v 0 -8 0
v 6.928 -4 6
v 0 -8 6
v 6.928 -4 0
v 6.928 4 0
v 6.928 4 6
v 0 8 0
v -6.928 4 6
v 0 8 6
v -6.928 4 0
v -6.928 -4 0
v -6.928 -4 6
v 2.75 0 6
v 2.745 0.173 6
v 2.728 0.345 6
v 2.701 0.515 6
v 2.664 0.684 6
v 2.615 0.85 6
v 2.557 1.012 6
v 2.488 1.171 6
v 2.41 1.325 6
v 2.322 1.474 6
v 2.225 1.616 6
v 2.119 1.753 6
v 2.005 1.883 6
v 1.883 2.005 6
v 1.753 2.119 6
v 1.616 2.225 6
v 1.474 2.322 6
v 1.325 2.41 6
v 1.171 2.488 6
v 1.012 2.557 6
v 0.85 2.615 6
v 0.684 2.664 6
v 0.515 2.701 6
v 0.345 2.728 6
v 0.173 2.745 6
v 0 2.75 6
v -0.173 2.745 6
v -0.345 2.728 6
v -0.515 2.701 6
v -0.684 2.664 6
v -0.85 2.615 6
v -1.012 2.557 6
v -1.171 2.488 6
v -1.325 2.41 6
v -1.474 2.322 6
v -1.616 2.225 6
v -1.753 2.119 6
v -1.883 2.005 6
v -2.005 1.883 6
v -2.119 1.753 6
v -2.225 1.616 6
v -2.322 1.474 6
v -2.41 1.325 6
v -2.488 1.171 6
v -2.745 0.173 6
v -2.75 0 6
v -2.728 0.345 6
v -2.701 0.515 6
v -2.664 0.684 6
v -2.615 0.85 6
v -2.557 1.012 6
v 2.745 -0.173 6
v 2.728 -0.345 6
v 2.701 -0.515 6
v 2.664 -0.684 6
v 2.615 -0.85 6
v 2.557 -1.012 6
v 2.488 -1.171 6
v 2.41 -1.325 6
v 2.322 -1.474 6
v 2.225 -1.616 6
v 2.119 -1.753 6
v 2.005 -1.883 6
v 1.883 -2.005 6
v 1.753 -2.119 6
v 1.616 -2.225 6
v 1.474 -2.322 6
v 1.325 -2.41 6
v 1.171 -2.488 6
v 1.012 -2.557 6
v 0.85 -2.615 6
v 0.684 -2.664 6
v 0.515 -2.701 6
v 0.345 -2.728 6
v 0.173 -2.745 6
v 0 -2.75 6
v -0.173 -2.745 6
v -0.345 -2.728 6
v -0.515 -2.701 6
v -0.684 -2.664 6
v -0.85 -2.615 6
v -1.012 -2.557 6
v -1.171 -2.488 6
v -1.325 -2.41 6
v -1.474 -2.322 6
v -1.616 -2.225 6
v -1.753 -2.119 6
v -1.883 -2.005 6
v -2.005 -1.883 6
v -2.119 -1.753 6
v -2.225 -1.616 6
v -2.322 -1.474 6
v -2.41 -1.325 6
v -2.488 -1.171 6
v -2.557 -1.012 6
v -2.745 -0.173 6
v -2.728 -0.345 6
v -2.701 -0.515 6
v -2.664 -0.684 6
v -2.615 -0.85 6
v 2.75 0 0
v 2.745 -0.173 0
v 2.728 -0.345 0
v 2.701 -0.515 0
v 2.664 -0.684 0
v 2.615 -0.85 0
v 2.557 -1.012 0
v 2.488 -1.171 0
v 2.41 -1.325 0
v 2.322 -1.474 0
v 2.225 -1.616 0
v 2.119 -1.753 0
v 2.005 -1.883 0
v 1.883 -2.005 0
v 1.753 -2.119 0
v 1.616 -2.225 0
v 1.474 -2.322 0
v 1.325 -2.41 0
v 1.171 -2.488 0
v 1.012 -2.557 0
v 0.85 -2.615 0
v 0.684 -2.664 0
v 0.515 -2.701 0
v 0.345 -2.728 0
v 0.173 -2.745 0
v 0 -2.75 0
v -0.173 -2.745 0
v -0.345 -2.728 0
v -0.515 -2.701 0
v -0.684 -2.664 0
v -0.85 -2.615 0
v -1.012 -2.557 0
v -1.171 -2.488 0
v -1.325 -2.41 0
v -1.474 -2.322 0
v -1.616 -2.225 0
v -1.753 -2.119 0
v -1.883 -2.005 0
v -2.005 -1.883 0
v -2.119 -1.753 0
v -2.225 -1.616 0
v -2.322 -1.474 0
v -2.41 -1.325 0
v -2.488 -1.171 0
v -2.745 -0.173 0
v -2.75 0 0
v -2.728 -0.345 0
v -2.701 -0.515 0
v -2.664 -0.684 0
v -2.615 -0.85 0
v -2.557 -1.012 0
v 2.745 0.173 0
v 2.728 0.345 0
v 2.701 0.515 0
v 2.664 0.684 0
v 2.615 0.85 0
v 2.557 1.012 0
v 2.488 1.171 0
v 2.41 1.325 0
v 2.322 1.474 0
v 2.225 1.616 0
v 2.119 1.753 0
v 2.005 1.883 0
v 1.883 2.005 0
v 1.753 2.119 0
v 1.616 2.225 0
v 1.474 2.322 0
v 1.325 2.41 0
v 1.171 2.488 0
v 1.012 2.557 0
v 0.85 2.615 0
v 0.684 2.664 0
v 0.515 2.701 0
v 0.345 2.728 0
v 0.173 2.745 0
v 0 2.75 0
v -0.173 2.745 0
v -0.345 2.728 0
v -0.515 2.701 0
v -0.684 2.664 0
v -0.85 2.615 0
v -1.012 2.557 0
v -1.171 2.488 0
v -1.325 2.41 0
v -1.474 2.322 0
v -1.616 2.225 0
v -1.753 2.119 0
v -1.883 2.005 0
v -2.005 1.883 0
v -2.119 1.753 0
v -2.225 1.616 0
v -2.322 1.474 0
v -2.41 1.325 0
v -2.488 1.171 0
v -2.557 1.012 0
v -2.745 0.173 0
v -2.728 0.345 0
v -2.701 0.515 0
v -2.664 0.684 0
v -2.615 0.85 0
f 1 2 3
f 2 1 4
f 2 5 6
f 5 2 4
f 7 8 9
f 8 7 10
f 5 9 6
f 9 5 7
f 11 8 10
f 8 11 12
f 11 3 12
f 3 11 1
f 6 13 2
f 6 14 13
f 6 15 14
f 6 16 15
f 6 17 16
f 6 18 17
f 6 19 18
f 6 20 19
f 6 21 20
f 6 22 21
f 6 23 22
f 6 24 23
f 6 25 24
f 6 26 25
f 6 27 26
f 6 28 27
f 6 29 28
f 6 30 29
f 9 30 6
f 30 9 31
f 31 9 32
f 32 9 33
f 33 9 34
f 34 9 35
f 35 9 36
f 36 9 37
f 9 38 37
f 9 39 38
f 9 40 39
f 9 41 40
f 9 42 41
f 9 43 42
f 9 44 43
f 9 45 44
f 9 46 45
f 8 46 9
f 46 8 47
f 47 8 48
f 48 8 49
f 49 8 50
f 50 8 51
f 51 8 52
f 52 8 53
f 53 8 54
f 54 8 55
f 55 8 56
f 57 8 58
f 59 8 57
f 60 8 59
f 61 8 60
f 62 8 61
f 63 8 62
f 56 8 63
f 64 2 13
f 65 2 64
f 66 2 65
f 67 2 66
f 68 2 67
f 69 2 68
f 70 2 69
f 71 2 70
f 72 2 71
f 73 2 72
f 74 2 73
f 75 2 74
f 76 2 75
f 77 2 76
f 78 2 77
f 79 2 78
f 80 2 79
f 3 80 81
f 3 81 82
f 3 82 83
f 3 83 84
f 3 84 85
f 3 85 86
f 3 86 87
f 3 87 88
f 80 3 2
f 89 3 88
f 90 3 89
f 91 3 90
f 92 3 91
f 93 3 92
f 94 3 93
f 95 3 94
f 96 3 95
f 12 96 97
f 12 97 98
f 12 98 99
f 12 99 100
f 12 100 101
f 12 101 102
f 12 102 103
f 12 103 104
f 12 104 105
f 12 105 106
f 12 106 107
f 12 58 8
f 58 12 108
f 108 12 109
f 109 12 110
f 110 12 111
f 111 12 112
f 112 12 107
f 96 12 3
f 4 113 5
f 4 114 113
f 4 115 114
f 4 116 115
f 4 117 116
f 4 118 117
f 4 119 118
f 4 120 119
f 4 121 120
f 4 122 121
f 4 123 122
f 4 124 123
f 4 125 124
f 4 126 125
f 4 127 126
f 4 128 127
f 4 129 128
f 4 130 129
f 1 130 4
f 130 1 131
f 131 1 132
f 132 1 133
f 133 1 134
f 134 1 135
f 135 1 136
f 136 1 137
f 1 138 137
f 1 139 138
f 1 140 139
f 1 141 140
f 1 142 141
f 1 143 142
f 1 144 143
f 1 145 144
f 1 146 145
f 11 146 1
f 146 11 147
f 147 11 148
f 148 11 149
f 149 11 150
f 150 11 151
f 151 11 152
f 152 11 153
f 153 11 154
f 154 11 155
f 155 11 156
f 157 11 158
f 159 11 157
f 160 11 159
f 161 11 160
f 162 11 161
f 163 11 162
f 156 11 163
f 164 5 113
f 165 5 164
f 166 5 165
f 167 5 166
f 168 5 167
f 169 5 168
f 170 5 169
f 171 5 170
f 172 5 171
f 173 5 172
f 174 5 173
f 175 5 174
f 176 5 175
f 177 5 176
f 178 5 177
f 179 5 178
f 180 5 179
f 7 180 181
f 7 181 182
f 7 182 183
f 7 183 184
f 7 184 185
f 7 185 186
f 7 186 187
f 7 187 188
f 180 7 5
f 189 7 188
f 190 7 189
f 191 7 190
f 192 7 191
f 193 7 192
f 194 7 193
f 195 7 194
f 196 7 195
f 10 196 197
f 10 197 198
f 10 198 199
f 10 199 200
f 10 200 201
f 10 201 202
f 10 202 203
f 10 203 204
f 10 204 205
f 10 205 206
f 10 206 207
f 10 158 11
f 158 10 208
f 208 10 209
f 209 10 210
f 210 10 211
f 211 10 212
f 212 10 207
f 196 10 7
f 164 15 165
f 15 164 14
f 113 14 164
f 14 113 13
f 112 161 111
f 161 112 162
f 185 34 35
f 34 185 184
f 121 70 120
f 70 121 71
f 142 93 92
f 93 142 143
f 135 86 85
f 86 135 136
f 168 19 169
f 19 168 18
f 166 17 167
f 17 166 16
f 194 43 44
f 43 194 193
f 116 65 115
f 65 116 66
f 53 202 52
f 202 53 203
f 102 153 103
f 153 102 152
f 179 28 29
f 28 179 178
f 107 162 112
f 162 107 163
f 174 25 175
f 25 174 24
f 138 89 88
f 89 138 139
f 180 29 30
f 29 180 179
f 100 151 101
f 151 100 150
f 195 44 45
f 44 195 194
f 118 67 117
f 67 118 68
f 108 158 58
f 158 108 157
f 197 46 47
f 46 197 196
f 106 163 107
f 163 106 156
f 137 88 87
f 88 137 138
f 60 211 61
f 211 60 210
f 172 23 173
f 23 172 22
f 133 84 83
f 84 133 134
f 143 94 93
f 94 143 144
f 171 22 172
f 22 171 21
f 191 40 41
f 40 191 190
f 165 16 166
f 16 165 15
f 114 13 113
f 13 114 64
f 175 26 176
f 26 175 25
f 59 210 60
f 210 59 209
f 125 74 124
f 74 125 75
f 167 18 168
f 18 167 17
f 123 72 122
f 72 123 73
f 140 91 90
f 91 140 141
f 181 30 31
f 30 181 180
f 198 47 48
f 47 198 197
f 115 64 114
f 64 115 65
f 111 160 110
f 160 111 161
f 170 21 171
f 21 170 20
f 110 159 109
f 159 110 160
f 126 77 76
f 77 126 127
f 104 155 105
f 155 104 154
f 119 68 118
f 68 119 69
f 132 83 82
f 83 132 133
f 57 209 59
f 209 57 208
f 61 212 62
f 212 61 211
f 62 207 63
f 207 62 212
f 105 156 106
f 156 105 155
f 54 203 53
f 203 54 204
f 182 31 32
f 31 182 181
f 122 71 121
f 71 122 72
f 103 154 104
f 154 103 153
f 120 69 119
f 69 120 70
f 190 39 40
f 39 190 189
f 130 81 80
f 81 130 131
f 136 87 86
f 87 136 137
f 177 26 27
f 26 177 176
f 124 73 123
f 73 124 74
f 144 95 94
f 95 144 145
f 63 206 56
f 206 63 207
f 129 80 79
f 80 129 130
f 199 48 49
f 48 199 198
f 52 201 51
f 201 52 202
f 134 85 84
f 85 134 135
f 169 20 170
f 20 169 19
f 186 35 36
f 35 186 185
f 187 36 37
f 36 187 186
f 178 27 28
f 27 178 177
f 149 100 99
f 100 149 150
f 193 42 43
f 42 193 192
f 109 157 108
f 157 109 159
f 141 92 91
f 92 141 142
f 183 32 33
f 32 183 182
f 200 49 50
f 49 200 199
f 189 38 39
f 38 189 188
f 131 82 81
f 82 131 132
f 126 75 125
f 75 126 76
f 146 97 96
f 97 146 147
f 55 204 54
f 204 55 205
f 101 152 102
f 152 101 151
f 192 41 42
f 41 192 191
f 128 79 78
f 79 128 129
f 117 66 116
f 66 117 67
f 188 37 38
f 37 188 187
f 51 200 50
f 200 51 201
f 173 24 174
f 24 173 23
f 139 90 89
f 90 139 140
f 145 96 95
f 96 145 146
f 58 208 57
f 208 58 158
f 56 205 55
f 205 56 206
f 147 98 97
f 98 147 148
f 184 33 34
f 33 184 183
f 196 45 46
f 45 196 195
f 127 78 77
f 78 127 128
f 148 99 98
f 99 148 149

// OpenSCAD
// file: debug_functions.scad
// pct (0..100) -> t (0..path_portion)
function pct_to_t(pct, path_portion=1.0) = (pct/100) * path_portion;

// pega ponto no path em um pct
function path_point_at_pct(
    pct, hub_d, hub_height, blade_length, blade_offset,
    leadW_pct, trailW_pct, leadX_pct, trailX_pct,
    path_portion=1.0
) =
    toroidal_path_spline_3d(
        pct_to_t(pct, path_portion),
        hub_d, hub_height, blade_length, blade_offset,
        leadW_pct, trailW_pct, leadX_pct, trailX_pct
    );

// desenha todos os perfis nas posições correspondentes
// n_profiles = quantidade de itens que você tem em profiles/chords/etc
module draw_profiles_on_path(
    n_profiles,
    profiles, profile_pcts, chords, chord_pivot_pcts, attack_angles,
    hub_d, hub_height, blade_length, blade_offset,
    leadW_pct, trailW_pct, leadX_pct, trailX_pct,
    path_portion=1.0
){
    for (i=[0:n_profiles-1]) {
        p = path_point_at_pct(
            profile_pcts[i],
            hub_d, hub_height, blade_length, blade_offset,
            leadW_pct, trailW_pct, leadX_pct, trailX_pct,
            path_portion
        );

        // Coloca o perfil “chapado” no plano XY, centrado no ponto do path.
        // (A orientação ao longo da tangente a gente faz no próximo passo.)
        translate(p)
            draw_profile2D(
                profiles[i],
                chord = chords[i],
                chord_pivot_pct = chord_pivot_pcts[i],
                attack_angle = attack_angles[i]
            );
    }
}


// ============================================================
// desenhar caminho (tubo) a partir de uma lista de pontos 3D
// ============================================================
module path_polyline(points, steps, r=0.35){
    for (i = [0:steps-1]) {
        p0 = points[i];
        p1 = points[i+1];
        v  = p1 - p0;
        L  = norm(v);

        if (L > 1e-9) {
            translate(p0)
                rotate(
                    a = acos(v[2]/L),
                    v = [-v[1], v[0], 0]
                )
                    cylinder(h=L, r=r, $fn=24);
        }
    }
}

module path_points_debug(points, r=0.6){
    for (p = points) translate(p) sphere(r=r, $fn=24);
}


// ============================================================
// Desenha o perfil 2D com corda (chord)
// chord_pivot_pct: 0=LE, 50=meio, 100=TE
// ============================================================
module draw_profile2D(profile, chord=10, chord_pivot_pct=0, attack_angle=0, n=90){
    px = chord_pivot_pct/100;
    pts = profile_points(profile, n=n);

    // move pivot para x=0 e escala pela corda
    pts2 = [ for(p=pts) [ (p[0]-px)*chord, p[1]*chord ] ];

    rotate(attack_angle)
        polygon(points=pts2);
}

// ============================================================
// Polyline 2D -> desenha como "tubo" usando cilindros (sem len())
// steps2d = quantidade de segmentos (se pts tem N pontos, use N)
// ============================================================
module polyline2d_tube(pts2d, steps2d, r=0.12){
    for(i=[0:steps2d-2]){
        p0 = pts2d[i];
        p1 = pts2d[i+1];
        v  = [p1[0]-p0[0], p1[1]-p0[1], 0];
        L  = norm(v);

        if (L > 1e-9){
            translate([p0[0], p0[1], 0])
                rotate(a = acos(clamp(v[0]/L, -1, 1)), v=[0,0,1])
                    cylinder(h=L, r=r, $fn=16);
        }
    }
}

// fecha o contorno (liga último ao primeiro)
module polyline2d_tube_closed(pts2d, steps2d, r=0.12){
    polyline2d_tube(pts2d, steps2d, r=r);
    // fecha com o último segmento
    p0 = pts2d[steps2d-1];
    p1 = pts2d[0];
    v  = [p1[0]-p0[0], p1[1]-p0[1], 0];
    L  = norm(v);

    if (L > 1e-9){
        translate([p0[0], p0[1], 0])
            rotate(a = acos(clamp(v[0]/L, -1, 1)), v=[0,0,1])
                cylinder(h=L, r=r, $fn=16);
    }
}

// ============================================================
// Desenha o perfil como "linha" (tubo) já com chord/pivot/attack
// profile_line_steps é o N usado para gerar os pontos do perfil.
// Para ellipse: N = n (ex: 120)
// Para naca:    N = 2*(n+1) + 2*(n+1) ??? (no nosso naca4_points: concat(upper,lower) => 2*(n+1))
// então: steps2d = 2*(n+1) no NACA e steps2d = n no ellipse
// ============================================================
module draw_profile2D_as_line(profile, chord=10, chord_pivot_pct=0, attack_angle=0, n=90, r=0.12){
    px  = chord_pivot_pct/100;
    pts = profile_points(profile, n=n);

    // aplica pivot + chord
    pts2 = [ for(p=pts) [ (p[0]-px)*chord, p[1]*chord ] ];

    // rotaciona o perfil no plano (attack)
    // (fazendo rotação manual em 2D pra evitar depender de rotate() em filhos)
    ca = cos(attack_angle);
    sa = sin(attack_angle);
    pts3 = [ for(p=pts2) [ p[0]*ca - p[1]*sa, p[0]*sa + p[1]*ca ] ];

    // número de pontos do contorno:
    steps2d = list_size(pts3);

    polyline2d_tube_closed(pts3, steps2d, r=r);
}
// main file
// ============================================================
// toroidal_propeller.scad
// ============================================================

eps=1/128;
$fn=100;

include <helper_functions.scad>;
include <debug_functions.scad>;

// ============================================================
// Perfis no caminho, perpendiculares ao caminho,
// com corda paralela ao plano XY e roll 180 só na leading half.
// ============================================================
module draw_profiles_on_path_perp(
    profiles, profile_pcts, chords, chord_pivot_pcts, attack_angles,
    hub_d, hub_height, blade_length, blade_offset,
    leadW_pct, trailW_pct, leadX_pct, trailX_pct,
    path_portion=1.0
){
    n_profiles = list_size(profiles);

    for (i=[0:n_profiles-1]) {

        // t do caminho (0..path_portion)
        t = (profile_pcts[i]/100) * path_portion;

        // posição e tangente
        P = toroidal_path_spline_3d(
            t, hub_d, hub_height, blade_length, blade_offset,
            leadW_pct, trailW_pct, leadX_pct, trailX_pct
        );

        T = path_tangent_at_t(
            t, hub_d, hub_height, blade_length, blade_offset,
            leadW_pct, trailW_pct, leadX_pct, trailX_pct,
            dt=1e-3
        );

        // protege contra listas desalinhadas (evita “sumir” perfil)
        if (
            !is_undef(profile_pcts[i]) &&
            !is_undef(chords[i]) &&
            !is_undef(chord_pivot_pcts[i]) &&
            !is_undef(attack_angles[i])
        )
        translate(P)
            orient_profile_perp_with_chord_xy(T)
                trailing_upper_lower_fix(t, path_portion)
                    leading_roll_180(t, path_portion)
                        draw_profile2D_as_line(
                            profiles[i],
                            chord = chords[i],
                            chord_pivot_pct = chord_pivot_pcts[i],
                            attack_angle = attack_angles[i],
                            n = 90,     // ajuste: 60..120 é comum
                            r = 0.12    // espessura da linha
                        );
    }
}


// ============================================================
// Módulo principal
// ============================================================
module toroidal_propeller(
    blades=1,

    hub_height=6,
    hub_d=16,
    hub_screw_d=5.5,
    hub_notch_height=0,
    hub_notch_d=0,

    blade_offset=2,
    blade_length=68,

    leading_edge_blade_width=18,
    trailing_edge_blade_width=18,
    leading_edge_blade_xoffset=50,
    trailing_edge_blade_xoffset=60,

    profiles=["8412",["ellipse",0.5],"2412"],
    profile_pcts=[0,50,100],
    chords=[8,2,6],
    chord_pivot_pcts=[0,0,0],
    attack_angles=[15,0,-10],

    path_portion=1.0
){
    // // Debug: caminho
    // steps = 120;
    // pts = toroidal_path_points(
    //     steps,
    //     hub_d, hub_height, blade_length, blade_offset,
    //     leading_edge_blade_width, trailing_edge_blade_width,
    //     leading_edge_blade_xoffset, trailing_edge_blade_xoffset,
    //     0, path_portion
    // );
    // path_polyline(pts, steps, r=0.35);

    // // Perfis ao longo do caminho
    // draw_profiles_on_path_perp(
    //     profiles, profile_pcts, chords, chord_pivot_pcts, attack_angles,
    //     hub_d, hub_height, blade_length, blade_offset,
    //     leading_edge_blade_width, trailing_edge_blade_width,
    //     leading_edge_blade_xoffset, trailing_edge_blade_xoffset,
    //     path_portion
    // );

    loft_profiles_on_path_poly_follow(
        profiles, profile_pcts, chords, chord_pivot_pcts, attack_angles,
        hub_d, hub_height, blade_length, blade_offset,
        leading_edge_blade_width, trailing_edge_blade_width,
        leading_edge_blade_xoffset, trailing_edge_blade_xoffset,
        path_portion=path_portion,
        N=80,
        steps_per_span=16,
        caps=false
    );


    // Hub hex (se quiser reativar)
    difference() {
        union() {
            rotate([0,0,30]) cylinder(d=hub_d, h=hub_height, $fn=6);
        }
        translate([0,0,-eps]) cylinder(d=hub_screw_d, h=hub_height+2*eps);
        if (hub_notch_height>0 && hub_notch_d>0)
            translate([0,0,-eps]) cylinder(d=hub_notch_d, h=hub_notch_height+eps);
    }
}

// teste rápido
toroidal_propeller();
